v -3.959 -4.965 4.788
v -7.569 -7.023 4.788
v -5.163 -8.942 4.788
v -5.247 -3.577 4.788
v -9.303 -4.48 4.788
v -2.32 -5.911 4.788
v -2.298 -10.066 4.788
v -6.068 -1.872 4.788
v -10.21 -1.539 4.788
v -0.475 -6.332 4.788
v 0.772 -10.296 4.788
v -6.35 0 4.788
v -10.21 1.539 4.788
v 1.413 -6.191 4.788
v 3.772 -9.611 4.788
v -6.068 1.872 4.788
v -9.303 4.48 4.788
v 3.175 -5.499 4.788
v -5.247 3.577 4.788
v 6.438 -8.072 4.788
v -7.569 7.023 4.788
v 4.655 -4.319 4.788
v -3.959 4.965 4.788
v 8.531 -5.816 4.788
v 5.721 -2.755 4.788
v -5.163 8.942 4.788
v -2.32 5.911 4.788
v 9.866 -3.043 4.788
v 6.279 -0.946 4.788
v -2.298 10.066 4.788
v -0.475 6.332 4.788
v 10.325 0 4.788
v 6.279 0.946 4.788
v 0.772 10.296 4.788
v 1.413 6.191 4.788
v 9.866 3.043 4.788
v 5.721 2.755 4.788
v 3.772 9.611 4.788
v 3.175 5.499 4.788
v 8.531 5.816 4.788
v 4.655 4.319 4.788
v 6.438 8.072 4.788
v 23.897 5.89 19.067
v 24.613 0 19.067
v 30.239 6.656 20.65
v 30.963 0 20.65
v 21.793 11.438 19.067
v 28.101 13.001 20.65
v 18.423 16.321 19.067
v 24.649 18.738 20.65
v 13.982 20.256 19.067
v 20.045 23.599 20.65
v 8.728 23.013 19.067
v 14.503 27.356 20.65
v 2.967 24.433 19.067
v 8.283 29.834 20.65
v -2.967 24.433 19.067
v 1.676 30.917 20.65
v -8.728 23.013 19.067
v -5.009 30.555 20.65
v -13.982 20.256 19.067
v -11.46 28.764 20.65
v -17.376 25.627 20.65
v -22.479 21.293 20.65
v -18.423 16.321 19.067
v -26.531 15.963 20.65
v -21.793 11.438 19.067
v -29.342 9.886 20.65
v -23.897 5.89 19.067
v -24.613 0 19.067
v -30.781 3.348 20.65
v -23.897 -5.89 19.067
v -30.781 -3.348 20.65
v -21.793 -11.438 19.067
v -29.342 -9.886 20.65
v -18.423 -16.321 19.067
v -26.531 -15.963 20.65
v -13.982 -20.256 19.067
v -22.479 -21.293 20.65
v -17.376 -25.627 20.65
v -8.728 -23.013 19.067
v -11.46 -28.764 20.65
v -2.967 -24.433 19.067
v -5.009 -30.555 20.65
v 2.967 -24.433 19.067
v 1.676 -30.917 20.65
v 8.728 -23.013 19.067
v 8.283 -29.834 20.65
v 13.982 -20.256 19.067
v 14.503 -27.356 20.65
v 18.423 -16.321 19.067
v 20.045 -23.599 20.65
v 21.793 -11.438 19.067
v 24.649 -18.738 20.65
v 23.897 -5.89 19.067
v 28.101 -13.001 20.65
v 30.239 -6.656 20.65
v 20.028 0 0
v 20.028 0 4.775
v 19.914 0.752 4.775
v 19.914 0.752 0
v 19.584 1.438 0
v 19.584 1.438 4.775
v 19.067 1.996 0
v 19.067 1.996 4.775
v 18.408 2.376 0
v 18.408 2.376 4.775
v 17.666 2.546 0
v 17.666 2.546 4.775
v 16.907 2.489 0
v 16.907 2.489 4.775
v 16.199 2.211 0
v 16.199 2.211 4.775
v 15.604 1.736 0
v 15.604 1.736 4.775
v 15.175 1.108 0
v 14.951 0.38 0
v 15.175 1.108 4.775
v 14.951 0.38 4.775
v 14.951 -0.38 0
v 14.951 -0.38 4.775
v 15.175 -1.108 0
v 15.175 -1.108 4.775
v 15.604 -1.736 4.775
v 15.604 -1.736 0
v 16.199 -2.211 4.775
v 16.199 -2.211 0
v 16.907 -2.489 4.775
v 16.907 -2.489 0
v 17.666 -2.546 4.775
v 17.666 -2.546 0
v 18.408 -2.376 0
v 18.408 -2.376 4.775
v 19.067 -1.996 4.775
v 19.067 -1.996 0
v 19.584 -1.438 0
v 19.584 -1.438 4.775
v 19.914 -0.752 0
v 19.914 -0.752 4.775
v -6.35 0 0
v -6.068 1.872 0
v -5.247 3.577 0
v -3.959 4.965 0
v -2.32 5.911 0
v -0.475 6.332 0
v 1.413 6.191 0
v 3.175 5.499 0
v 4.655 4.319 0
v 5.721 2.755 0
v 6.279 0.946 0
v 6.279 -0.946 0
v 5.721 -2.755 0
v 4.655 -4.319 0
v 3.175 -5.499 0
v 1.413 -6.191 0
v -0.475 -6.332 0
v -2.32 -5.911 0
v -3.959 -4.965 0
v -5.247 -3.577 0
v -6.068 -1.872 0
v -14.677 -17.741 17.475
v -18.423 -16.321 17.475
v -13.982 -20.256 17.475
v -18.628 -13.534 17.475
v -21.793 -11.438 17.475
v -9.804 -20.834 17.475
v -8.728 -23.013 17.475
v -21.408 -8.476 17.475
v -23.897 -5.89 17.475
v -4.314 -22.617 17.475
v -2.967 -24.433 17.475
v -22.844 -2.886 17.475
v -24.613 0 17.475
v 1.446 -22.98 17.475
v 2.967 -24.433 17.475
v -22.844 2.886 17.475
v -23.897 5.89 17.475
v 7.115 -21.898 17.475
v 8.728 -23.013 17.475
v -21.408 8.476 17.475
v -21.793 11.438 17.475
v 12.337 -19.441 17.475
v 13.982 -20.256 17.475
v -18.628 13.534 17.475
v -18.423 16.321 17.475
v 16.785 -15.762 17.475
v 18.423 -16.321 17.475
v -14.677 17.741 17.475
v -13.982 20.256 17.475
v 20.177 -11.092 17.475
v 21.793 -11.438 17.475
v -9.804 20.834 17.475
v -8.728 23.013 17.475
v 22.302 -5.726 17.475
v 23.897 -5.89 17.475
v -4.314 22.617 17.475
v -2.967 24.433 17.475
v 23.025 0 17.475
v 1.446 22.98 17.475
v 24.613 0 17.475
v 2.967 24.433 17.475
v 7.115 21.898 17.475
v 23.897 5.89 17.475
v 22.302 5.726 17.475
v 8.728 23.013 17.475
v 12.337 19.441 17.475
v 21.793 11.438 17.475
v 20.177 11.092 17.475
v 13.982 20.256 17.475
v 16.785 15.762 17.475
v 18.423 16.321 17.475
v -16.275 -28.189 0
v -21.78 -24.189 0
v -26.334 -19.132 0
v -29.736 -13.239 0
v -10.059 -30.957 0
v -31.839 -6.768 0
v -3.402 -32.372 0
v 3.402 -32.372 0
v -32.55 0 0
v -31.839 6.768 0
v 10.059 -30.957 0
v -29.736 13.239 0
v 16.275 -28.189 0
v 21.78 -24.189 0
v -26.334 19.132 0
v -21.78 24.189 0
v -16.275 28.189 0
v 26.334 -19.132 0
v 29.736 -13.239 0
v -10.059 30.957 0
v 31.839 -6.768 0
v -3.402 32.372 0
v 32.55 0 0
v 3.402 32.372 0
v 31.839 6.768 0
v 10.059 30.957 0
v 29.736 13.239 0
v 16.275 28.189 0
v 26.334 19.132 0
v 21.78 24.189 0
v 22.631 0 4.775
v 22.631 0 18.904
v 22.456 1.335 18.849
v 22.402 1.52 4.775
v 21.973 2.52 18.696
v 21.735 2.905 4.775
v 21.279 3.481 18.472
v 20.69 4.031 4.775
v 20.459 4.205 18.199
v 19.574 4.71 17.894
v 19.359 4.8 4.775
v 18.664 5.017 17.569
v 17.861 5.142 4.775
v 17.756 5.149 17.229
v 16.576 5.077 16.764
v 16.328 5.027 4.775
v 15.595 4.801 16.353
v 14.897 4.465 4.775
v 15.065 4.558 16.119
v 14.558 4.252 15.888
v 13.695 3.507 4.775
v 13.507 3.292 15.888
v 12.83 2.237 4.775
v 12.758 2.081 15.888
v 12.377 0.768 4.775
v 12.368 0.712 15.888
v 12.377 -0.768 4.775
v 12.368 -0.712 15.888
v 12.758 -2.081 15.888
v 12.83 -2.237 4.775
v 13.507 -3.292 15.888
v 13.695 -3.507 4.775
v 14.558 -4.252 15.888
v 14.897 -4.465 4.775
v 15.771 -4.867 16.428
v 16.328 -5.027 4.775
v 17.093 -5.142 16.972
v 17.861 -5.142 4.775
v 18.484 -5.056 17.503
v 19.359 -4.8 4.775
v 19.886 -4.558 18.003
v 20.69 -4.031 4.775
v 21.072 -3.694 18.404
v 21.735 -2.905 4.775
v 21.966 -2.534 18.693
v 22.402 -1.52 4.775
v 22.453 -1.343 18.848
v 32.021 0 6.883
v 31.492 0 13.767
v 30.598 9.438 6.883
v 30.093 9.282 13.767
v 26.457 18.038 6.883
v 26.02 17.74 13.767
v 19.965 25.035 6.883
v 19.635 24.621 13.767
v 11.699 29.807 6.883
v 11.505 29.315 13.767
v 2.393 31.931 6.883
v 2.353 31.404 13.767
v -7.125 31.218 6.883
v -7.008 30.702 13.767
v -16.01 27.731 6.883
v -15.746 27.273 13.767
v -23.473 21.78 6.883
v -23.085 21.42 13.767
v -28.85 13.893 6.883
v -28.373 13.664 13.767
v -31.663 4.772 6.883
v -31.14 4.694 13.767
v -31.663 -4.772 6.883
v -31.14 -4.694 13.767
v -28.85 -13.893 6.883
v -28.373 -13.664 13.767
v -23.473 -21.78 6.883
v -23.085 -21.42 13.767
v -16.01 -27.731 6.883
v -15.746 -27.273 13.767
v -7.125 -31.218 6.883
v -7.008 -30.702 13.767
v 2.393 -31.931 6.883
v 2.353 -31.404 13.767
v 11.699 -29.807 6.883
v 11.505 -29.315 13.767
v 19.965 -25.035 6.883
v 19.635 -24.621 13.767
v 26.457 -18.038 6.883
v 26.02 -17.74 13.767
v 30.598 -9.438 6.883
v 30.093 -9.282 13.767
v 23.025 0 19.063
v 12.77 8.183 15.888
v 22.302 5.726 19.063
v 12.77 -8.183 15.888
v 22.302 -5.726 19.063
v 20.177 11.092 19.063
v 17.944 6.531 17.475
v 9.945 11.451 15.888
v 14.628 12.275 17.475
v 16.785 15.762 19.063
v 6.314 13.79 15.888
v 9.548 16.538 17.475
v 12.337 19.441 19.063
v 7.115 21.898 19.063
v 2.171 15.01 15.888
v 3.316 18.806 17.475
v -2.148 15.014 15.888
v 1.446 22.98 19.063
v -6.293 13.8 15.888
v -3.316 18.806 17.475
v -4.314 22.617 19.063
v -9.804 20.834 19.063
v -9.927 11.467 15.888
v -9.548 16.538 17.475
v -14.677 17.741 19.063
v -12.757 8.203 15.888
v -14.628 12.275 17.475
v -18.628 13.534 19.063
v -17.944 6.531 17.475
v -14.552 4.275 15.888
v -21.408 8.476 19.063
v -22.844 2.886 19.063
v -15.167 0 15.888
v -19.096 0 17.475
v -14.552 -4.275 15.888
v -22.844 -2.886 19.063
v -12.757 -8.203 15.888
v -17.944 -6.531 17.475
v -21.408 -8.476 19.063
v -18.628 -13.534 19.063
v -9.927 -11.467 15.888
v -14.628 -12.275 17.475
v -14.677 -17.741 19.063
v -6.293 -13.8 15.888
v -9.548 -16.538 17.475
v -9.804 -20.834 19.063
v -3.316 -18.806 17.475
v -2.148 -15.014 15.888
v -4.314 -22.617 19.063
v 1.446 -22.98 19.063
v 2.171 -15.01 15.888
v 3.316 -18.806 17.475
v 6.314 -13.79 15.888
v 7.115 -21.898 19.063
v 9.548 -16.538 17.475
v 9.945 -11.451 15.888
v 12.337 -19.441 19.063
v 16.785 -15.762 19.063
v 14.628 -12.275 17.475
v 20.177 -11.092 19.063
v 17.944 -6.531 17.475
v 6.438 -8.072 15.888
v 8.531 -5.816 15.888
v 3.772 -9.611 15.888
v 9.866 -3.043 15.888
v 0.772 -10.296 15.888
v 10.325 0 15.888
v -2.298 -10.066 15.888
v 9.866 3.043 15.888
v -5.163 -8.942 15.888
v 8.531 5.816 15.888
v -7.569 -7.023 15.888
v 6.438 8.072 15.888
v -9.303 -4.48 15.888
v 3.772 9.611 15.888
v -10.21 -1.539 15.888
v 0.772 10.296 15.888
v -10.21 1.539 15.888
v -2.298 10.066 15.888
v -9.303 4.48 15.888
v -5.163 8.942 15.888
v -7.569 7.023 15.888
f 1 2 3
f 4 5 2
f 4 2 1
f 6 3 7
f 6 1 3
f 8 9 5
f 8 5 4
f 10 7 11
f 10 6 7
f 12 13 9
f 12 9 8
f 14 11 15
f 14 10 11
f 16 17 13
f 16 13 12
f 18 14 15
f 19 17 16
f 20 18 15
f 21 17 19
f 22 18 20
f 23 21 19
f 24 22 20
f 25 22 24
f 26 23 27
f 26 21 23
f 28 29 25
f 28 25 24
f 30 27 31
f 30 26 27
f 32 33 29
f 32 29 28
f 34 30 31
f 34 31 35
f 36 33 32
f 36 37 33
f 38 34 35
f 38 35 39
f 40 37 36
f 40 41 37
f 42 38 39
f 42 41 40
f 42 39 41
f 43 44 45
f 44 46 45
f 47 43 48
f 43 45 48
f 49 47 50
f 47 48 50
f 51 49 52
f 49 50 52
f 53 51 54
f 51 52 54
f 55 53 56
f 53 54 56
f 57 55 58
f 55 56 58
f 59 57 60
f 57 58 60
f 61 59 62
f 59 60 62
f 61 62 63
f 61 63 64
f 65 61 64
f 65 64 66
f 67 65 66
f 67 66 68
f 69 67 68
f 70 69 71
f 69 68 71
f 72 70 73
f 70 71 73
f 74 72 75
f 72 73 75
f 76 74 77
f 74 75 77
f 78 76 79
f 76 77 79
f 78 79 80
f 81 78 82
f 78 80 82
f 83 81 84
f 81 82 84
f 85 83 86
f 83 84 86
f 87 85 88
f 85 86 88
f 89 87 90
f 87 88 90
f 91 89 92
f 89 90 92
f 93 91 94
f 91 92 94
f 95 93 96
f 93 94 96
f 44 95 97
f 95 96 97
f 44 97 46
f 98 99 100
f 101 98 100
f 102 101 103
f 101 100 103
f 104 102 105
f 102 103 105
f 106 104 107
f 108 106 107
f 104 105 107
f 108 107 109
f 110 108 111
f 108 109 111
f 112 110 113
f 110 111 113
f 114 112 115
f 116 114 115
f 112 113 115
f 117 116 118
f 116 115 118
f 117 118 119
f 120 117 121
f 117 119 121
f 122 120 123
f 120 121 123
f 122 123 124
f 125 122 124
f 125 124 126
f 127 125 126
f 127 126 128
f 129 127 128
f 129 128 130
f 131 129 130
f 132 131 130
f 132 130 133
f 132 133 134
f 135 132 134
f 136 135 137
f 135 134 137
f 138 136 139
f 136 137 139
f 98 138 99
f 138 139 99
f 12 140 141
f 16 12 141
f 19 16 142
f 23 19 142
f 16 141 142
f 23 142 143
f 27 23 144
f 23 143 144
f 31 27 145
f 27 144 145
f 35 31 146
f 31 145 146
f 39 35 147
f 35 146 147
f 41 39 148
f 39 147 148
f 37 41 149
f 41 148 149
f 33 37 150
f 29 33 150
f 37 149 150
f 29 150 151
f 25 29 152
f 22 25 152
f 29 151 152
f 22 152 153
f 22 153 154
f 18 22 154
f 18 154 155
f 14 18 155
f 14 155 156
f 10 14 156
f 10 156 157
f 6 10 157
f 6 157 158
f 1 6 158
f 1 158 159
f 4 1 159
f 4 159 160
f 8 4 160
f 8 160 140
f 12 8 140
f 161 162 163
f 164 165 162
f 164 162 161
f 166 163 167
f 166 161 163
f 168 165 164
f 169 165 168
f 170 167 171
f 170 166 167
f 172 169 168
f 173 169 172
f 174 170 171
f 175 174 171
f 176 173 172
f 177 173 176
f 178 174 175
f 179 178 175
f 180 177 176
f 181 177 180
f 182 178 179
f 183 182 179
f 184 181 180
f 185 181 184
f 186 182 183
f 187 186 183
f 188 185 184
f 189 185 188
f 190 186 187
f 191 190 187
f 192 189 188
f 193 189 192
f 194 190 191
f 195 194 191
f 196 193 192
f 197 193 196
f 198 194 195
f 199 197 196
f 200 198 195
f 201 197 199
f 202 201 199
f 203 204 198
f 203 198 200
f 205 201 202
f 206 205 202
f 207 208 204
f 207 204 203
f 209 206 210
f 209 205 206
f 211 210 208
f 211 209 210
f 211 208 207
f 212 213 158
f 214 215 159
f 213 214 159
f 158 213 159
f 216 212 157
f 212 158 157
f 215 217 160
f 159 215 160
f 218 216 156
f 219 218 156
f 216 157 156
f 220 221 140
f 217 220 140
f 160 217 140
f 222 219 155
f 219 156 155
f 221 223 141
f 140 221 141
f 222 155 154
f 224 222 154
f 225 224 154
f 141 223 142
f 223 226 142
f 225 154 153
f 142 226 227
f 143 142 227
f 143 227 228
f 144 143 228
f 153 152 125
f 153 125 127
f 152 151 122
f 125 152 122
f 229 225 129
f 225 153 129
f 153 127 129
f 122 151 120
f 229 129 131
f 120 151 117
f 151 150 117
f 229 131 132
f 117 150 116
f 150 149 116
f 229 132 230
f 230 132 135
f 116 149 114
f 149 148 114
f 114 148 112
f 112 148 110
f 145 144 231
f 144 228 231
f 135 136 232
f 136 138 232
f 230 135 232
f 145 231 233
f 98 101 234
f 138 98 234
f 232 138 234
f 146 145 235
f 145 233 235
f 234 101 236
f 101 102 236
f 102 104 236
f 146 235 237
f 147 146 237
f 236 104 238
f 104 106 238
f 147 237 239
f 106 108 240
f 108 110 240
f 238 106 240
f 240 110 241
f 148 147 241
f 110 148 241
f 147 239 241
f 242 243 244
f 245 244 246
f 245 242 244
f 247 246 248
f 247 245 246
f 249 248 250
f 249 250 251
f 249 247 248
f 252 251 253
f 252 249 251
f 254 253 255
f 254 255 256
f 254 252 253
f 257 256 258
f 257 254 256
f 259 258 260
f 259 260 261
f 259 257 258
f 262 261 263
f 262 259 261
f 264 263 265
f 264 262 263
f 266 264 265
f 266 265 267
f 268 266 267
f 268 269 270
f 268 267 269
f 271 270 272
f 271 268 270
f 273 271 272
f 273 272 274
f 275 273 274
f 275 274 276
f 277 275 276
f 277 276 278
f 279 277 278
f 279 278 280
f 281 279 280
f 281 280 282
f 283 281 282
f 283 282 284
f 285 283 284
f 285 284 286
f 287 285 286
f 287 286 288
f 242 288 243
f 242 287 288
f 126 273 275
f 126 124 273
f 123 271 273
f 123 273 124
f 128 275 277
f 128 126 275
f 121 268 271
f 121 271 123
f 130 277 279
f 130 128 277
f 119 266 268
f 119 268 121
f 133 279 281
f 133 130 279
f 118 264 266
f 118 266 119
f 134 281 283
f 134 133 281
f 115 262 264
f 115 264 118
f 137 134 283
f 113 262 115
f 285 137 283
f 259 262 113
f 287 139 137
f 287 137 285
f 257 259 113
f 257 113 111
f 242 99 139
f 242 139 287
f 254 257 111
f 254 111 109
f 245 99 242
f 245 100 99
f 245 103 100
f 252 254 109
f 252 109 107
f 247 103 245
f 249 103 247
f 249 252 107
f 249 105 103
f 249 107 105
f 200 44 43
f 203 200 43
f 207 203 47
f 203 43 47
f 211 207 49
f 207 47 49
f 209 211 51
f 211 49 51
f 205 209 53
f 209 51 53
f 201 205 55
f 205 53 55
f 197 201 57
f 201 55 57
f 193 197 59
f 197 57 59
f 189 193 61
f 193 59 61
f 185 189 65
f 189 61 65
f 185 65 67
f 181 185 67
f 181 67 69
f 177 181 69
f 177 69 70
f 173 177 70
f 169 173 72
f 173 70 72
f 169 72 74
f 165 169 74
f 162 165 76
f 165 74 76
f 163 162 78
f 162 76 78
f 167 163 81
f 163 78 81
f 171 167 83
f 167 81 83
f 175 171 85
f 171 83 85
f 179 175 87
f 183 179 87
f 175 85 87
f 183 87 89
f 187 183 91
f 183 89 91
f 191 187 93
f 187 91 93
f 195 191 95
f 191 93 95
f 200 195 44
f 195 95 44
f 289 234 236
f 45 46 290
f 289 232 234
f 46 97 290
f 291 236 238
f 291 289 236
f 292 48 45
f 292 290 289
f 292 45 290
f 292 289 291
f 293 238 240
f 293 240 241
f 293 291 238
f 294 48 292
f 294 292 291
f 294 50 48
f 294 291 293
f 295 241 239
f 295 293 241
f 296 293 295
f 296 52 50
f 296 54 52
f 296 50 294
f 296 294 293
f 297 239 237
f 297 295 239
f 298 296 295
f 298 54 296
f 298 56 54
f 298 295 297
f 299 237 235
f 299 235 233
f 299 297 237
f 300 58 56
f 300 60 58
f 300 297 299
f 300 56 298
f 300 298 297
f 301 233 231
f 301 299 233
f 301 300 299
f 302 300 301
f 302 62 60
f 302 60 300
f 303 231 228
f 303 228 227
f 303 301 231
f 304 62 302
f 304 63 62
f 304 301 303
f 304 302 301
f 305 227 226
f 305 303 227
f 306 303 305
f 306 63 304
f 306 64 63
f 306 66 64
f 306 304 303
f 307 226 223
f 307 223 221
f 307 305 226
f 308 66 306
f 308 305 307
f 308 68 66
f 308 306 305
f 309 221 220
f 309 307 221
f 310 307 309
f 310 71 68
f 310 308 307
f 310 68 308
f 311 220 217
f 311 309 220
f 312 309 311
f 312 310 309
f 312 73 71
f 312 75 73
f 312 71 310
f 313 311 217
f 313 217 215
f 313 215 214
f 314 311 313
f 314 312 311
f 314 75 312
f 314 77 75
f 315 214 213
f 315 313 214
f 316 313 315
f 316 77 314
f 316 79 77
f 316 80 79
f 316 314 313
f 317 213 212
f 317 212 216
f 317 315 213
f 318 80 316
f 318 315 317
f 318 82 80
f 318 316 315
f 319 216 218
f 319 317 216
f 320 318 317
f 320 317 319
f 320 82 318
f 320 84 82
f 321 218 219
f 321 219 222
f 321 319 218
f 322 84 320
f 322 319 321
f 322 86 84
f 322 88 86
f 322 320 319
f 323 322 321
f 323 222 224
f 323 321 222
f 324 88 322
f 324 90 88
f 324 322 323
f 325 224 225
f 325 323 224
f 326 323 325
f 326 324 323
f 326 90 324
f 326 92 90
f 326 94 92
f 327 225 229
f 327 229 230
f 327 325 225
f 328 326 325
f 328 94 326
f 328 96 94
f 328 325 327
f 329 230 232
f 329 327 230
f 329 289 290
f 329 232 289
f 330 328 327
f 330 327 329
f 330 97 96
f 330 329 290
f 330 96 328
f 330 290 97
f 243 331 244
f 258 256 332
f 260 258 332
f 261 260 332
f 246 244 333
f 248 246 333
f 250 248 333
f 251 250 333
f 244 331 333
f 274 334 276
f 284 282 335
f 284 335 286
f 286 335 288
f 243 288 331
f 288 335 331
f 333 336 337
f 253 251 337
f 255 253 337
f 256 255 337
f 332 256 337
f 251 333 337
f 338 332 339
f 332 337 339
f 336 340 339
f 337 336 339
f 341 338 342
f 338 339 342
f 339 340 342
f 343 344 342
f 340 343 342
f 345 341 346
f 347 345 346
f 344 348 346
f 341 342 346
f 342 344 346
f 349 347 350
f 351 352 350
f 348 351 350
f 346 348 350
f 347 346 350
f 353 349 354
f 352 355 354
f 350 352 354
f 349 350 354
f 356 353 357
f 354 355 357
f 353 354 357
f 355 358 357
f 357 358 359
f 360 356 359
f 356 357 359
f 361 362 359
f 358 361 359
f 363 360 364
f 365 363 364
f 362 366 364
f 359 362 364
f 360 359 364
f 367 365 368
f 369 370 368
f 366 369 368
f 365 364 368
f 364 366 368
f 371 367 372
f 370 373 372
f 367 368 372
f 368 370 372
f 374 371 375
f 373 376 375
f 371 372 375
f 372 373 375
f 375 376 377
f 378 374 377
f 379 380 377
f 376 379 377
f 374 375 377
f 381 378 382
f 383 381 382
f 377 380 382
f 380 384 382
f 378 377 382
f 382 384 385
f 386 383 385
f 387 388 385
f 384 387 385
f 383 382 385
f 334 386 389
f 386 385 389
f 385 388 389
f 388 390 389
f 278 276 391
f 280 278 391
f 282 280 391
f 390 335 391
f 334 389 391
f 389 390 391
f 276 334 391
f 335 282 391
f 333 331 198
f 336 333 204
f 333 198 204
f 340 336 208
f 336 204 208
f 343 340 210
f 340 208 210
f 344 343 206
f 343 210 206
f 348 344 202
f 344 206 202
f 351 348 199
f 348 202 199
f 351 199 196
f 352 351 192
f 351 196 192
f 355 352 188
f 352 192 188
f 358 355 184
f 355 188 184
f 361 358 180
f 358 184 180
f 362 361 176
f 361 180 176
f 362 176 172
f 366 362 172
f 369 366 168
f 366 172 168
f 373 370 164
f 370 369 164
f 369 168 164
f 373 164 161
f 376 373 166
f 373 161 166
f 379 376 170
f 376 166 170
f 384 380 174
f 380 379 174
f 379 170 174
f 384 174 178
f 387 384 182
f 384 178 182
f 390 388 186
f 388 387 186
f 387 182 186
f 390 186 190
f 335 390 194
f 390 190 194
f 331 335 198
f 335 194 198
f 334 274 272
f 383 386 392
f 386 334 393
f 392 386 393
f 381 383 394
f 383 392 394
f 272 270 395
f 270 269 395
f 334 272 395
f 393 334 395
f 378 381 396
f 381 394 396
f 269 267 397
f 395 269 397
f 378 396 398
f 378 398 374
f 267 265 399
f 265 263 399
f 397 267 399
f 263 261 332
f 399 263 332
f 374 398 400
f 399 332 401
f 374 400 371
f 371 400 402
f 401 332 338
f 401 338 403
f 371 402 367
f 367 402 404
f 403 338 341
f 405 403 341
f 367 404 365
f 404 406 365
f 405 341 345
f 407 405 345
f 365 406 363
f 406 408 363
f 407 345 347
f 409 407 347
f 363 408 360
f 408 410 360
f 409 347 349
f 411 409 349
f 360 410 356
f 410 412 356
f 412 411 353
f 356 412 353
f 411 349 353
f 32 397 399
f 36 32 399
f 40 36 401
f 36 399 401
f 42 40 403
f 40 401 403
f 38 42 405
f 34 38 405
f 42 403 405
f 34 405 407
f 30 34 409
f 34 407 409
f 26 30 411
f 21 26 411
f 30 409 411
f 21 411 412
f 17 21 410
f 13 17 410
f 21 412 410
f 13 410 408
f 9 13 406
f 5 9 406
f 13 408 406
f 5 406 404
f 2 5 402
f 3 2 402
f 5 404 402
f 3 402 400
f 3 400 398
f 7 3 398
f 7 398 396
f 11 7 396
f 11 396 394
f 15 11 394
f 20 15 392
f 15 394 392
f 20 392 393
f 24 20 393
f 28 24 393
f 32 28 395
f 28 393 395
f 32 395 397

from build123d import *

# Parameters (mm, degrees)
F0_R      = 32.5501
F2_R      = 30.9626
F7_R      = 24.6126
F7_R_2    = 23.0251
F8_DEPTH  = 1.5875
F13_R     = 10.3251
F14_DEPTH = 11.0998
F17_D     = 12.7
F18_R     = 2.5527
F19_DEPTH = 25.4
F21_R     = 5.1562
F22_DEPTH = 25.4


with BuildPart() as f3:
    # F0 (on Top) → F3 section 0
    with BuildSketch(Plane.XY):
        Circle(F0_R)
    # F2 (on offset) → F3 section 1
    with BuildSketch(Plane.XY.offset(20.6502)):
        Circle(F2_R)
    loft()


with BuildPart() as f5:
    # F4 (on Front) → F5 (revolve)
    with BuildSketch(Plane.XZ):
        Polygon((30.9626, 20.6502), (0, 20.6502), (0, 19.0627), (24.595485268, 19.0627), align=None)
    revolve(axis=Axis((0, 0, 0), (0, 0, 1)))


with BuildPart() as f3_1:
    add(f3.part)

    # F6: cut F5
    add(f5.part, mode=Mode.SUBTRACT)


with BuildPart() as f8:
    # F7 (on face) → F8 (new body, symmetric)
    with BuildSketch(Plane.XY.offset(19.0627)):
        Circle(F7_R)
        Circle(F7_R_2, mode=Mode.SUBTRACT)
    extrude(amount=F8_DEPTH, both=True)


with BuildPart() as f3_2:
    add(f3_1.part)

    # F9: cut F8
    add(f8.part, mode=Mode.SUBTRACT)


with BuildPart() as f11:
    # F10 (on Front) → F11 (revolve)
    with BuildSketch(Plane.XZ):
        Polygon((23.0251, 19.0627), (0, 19.0627), (0, 15.8877), (15.1666992404, 15.8877), align=None)
    revolve(axis=Axis((0, 0, 0), (0, 0, 1)))


with BuildPart() as f3_3:
    add(f3_2.part)

    # F12: cut F11
    add(f11.part, mode=Mode.SUBTRACT)


with BuildPart() as f14:
    # F13 (on face) → F14 (new body, symmetric)
    with BuildSketch(Plane.XY.offset(15.8877)):
        Circle(F13_R)
    extrude(amount=F14_DEPTH, both=True)


with BuildPart() as f3_4:
    add(f3_3.part)

    # F15: cut F14
    add(f14.part, mode=Mode.SUBTRACT)

    # F17 (through all)
    with Locations(Plane.XY.offset(4.7879)):
        with Locations((0, 0)):
            Hole(F17_D / 2)


with BuildPart() as f19:
    # F18 (on offset) → F19 (new body, symmetric)
    with BuildSketch(Plane.XY.offset(20.6502)):
        with Locations((17.4752, 0)):
            Circle(F18_R)
    extrude(amount=F19_DEPTH, both=True)


with BuildPart() as f3_5:
    add(f3_4.part)

    # F20: cut F19
    add(f19.part, mode=Mode.SUBTRACT)


with BuildPart() as f22:
    # F21 (on Top) → F22 (new body)
    with BuildSketch(Plane.XY):
        with Locations((17.4752, 0)):
            Circle(F21_R)
    extrude(amount=F22_DEPTH)


with BuildPart() as f22_1:
    # F23: moved
    add(f22.part.moved(Location((0, 0, 4.7752))))


with BuildPart() as f3_6:
    add(f3_5.part)

    # F24: cut F22
    add(f22_1.part, mode=Mode.SUBTRACT)


solid = f3_6.part
